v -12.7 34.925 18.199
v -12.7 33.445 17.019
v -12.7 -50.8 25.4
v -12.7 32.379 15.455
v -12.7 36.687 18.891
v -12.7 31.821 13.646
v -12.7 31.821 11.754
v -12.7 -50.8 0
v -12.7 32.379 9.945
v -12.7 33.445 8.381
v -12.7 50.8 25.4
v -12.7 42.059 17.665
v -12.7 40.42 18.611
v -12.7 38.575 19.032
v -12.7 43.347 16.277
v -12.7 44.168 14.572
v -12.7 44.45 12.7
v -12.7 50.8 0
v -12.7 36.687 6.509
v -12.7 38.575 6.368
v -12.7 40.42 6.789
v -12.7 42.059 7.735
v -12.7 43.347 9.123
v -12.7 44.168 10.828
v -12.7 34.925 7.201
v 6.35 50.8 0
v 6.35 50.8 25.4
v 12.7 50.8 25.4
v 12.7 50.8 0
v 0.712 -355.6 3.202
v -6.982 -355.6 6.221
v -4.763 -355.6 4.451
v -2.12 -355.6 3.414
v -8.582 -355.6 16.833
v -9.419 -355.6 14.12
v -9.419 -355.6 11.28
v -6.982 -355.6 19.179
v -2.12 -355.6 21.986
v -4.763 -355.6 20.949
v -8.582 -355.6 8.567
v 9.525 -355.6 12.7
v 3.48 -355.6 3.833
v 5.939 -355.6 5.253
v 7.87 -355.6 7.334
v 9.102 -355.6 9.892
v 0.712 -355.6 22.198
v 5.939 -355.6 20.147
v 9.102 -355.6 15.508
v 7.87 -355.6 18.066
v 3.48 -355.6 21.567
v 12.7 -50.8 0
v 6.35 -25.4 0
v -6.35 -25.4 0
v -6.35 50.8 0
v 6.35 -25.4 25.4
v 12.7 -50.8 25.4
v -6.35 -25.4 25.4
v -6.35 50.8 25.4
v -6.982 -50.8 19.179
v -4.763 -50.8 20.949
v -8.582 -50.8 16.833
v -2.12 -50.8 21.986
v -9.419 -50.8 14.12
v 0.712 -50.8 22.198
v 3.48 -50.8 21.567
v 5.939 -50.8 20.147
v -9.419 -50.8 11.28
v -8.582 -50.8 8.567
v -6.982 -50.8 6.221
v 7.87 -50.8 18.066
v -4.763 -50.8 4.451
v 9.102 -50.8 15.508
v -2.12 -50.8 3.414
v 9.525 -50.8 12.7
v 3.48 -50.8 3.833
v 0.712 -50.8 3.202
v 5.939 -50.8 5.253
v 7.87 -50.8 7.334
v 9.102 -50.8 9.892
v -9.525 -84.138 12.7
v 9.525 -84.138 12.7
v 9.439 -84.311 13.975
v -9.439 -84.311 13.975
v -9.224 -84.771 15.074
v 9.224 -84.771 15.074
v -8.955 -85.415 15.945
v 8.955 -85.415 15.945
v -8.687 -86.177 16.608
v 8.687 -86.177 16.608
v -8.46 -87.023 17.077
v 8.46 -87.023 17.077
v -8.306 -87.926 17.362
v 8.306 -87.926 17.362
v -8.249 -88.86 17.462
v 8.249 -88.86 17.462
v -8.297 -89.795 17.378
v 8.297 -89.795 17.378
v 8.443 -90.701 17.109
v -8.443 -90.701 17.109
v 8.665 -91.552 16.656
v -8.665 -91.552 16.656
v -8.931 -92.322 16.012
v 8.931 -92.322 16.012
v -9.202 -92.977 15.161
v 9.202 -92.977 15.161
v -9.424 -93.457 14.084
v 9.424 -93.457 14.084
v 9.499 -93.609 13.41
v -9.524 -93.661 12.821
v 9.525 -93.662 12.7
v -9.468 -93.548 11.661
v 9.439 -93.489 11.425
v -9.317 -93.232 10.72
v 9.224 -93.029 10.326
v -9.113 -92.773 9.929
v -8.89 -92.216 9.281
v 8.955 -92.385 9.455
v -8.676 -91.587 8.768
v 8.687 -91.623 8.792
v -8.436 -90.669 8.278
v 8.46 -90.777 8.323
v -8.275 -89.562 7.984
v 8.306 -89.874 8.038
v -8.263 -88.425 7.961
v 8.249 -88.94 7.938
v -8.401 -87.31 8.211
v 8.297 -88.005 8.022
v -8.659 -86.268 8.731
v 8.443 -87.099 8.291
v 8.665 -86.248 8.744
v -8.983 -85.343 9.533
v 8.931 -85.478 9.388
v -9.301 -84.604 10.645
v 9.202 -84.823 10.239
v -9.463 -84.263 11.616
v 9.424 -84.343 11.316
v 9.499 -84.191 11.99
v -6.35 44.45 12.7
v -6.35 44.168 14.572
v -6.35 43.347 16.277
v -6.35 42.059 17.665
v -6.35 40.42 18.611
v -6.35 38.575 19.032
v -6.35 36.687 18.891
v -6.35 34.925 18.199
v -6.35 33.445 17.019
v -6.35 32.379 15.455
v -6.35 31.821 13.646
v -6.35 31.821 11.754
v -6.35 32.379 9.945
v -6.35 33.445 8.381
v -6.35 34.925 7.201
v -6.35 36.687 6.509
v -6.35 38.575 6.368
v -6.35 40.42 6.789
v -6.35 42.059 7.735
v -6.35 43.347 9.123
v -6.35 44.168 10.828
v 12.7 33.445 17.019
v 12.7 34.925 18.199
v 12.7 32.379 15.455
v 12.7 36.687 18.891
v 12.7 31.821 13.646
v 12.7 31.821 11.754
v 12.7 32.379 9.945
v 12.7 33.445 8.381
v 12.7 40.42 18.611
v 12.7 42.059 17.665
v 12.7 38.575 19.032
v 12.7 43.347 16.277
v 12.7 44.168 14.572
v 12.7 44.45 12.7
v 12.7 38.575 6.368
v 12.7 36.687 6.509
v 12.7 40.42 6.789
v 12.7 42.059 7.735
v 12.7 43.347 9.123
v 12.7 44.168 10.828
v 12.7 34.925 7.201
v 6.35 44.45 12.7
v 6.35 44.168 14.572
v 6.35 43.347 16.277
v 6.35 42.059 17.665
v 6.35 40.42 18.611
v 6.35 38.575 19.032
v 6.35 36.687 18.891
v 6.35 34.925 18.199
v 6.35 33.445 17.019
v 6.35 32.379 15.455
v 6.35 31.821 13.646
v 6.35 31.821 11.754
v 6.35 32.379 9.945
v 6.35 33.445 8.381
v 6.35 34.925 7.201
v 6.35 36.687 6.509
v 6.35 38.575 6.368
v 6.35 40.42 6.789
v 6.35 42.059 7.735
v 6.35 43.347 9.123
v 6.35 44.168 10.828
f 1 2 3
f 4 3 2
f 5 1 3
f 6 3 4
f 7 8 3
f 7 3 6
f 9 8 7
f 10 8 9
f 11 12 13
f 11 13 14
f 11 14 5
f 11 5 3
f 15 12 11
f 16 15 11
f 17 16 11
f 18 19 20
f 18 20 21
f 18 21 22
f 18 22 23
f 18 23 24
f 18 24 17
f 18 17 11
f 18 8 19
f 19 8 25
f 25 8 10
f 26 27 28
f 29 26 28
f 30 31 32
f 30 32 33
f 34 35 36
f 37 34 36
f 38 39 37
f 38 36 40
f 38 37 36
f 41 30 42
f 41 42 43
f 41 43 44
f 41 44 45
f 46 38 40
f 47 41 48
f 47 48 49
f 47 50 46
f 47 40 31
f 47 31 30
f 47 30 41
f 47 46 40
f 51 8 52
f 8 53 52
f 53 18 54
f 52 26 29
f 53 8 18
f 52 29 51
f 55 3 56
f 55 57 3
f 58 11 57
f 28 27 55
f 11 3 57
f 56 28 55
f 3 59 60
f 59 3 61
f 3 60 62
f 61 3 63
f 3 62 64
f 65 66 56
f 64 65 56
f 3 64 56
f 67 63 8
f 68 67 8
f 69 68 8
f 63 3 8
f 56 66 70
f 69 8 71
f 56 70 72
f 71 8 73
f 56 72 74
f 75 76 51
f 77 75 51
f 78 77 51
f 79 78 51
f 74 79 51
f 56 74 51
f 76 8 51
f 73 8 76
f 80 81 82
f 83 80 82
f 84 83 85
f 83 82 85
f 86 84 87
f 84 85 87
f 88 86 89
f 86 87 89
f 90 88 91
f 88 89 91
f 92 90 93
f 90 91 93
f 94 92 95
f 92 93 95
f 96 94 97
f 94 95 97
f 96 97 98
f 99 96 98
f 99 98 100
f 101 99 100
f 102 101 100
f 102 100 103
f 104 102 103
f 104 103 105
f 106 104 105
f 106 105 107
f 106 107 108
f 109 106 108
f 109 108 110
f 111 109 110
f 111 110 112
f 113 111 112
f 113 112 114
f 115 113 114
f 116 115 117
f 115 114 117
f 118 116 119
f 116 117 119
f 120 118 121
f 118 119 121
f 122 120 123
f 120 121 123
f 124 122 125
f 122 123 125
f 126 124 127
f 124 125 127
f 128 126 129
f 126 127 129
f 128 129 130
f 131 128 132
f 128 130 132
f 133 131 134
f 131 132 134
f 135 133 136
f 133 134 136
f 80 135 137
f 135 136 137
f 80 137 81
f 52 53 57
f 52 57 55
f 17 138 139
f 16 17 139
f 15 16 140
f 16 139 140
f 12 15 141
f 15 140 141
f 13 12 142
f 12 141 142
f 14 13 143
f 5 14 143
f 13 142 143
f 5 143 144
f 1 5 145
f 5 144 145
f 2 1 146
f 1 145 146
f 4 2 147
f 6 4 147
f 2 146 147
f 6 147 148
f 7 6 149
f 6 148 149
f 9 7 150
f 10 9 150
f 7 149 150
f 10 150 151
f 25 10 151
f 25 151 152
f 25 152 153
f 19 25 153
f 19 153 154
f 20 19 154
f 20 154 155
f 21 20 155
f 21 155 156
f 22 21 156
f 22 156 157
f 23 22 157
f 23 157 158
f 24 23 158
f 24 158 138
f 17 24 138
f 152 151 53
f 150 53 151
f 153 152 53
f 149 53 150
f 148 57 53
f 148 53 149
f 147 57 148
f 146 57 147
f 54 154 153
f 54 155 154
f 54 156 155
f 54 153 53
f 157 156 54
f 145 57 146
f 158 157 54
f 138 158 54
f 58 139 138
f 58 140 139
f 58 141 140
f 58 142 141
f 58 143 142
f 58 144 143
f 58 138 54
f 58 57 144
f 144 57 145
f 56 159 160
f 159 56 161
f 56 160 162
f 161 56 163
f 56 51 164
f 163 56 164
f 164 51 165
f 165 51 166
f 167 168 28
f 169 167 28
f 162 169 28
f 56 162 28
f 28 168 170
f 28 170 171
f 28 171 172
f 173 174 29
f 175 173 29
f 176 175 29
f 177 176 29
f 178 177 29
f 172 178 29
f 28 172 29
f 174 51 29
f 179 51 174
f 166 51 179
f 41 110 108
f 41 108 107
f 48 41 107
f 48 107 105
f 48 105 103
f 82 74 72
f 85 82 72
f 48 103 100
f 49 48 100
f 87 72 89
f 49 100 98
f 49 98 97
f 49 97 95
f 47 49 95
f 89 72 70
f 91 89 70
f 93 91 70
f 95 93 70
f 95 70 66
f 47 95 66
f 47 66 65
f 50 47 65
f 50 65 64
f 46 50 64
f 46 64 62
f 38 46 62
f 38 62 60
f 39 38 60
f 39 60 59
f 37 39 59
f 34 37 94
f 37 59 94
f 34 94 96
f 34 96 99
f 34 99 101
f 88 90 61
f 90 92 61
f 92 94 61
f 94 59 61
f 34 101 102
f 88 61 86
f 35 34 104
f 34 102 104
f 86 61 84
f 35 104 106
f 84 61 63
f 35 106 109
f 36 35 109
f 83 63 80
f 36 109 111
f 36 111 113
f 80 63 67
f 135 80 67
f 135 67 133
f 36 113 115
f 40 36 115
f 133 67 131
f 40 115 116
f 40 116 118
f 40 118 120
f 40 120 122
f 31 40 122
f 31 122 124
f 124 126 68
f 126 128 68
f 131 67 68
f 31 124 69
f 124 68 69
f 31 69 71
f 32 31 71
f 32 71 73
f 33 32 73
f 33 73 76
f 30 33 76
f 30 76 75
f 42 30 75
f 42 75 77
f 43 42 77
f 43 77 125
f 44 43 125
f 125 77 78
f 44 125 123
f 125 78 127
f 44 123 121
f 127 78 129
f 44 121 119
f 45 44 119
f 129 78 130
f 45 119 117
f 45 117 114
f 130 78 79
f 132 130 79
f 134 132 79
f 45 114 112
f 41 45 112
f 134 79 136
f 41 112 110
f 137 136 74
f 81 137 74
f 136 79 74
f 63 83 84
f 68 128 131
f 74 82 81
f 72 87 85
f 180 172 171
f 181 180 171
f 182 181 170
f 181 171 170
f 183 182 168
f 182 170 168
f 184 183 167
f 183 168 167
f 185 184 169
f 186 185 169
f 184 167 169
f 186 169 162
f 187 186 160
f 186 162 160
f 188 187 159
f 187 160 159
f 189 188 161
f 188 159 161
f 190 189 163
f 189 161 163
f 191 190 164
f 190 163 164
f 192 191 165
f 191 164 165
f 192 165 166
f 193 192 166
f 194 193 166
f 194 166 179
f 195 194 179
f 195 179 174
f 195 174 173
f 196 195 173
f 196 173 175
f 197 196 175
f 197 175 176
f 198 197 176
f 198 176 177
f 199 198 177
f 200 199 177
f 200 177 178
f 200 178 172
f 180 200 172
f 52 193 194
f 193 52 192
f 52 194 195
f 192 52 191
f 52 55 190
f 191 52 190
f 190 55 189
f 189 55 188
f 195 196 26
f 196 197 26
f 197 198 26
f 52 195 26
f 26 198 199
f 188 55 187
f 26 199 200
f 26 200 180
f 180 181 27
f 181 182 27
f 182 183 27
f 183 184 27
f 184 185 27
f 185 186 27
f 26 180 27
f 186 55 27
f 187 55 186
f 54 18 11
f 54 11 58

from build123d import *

# Parameters (mm, degrees)
F0_W     = 25.4
F0_H     = 101.6
F1_DEPTH = 25.4
F2_W     = 12.7
F2_H     = 101.6
F3_DEPTH = 25.401
F4_R     = 6.35
F5_DEPTH = 25.401
F6_R     = 9.525
F7_DEPTH = 304.8
F8_R     = 4.7625
F9_DEPTH = 25.401


with BuildPart() as f1:
    # F0 (on Top) → F1 (new body)
    with BuildSketch(Plane.XY):
        Rectangle(F0_W, F0_H)
    extrude(amount=F1_DEPTH)

    # F2 (on face) → F3 (cut, through all)
    with BuildSketch(Plane.XY.offset(25.4)):
        with Locations((0, 25.4)):
            Rectangle(F2_W, F2_H)
    extrude(amount=-F3_DEPTH, mode=Mode.SUBTRACT)

    # F4 (on face) → F5 (cut, through all)
    with BuildSketch(Plane.YZ.offset(12.7)):
        with Locations((38.1, 12.7)):
            Circle(F4_R)
    extrude(amount=-F5_DEPTH, mode=Mode.SUBTRACT)

    # F6 (on face) → F7 (join)
    with BuildSketch(Plane.XZ.offset(50.8)):
        with Locations((0, 12.7)):
            Circle(F6_R)
    extrude(amount=F7_DEPTH)

    # F8 (on face) → F9 (cut, through all)
    with BuildSketch(Plane.YZ.offset(12.7)):
        with Locations((-88.9, 12.7)):
            Circle(F8_R)
    extrude(amount=-F9_DEPTH, mode=Mode.SUBTRACT)


solid = f1.part
